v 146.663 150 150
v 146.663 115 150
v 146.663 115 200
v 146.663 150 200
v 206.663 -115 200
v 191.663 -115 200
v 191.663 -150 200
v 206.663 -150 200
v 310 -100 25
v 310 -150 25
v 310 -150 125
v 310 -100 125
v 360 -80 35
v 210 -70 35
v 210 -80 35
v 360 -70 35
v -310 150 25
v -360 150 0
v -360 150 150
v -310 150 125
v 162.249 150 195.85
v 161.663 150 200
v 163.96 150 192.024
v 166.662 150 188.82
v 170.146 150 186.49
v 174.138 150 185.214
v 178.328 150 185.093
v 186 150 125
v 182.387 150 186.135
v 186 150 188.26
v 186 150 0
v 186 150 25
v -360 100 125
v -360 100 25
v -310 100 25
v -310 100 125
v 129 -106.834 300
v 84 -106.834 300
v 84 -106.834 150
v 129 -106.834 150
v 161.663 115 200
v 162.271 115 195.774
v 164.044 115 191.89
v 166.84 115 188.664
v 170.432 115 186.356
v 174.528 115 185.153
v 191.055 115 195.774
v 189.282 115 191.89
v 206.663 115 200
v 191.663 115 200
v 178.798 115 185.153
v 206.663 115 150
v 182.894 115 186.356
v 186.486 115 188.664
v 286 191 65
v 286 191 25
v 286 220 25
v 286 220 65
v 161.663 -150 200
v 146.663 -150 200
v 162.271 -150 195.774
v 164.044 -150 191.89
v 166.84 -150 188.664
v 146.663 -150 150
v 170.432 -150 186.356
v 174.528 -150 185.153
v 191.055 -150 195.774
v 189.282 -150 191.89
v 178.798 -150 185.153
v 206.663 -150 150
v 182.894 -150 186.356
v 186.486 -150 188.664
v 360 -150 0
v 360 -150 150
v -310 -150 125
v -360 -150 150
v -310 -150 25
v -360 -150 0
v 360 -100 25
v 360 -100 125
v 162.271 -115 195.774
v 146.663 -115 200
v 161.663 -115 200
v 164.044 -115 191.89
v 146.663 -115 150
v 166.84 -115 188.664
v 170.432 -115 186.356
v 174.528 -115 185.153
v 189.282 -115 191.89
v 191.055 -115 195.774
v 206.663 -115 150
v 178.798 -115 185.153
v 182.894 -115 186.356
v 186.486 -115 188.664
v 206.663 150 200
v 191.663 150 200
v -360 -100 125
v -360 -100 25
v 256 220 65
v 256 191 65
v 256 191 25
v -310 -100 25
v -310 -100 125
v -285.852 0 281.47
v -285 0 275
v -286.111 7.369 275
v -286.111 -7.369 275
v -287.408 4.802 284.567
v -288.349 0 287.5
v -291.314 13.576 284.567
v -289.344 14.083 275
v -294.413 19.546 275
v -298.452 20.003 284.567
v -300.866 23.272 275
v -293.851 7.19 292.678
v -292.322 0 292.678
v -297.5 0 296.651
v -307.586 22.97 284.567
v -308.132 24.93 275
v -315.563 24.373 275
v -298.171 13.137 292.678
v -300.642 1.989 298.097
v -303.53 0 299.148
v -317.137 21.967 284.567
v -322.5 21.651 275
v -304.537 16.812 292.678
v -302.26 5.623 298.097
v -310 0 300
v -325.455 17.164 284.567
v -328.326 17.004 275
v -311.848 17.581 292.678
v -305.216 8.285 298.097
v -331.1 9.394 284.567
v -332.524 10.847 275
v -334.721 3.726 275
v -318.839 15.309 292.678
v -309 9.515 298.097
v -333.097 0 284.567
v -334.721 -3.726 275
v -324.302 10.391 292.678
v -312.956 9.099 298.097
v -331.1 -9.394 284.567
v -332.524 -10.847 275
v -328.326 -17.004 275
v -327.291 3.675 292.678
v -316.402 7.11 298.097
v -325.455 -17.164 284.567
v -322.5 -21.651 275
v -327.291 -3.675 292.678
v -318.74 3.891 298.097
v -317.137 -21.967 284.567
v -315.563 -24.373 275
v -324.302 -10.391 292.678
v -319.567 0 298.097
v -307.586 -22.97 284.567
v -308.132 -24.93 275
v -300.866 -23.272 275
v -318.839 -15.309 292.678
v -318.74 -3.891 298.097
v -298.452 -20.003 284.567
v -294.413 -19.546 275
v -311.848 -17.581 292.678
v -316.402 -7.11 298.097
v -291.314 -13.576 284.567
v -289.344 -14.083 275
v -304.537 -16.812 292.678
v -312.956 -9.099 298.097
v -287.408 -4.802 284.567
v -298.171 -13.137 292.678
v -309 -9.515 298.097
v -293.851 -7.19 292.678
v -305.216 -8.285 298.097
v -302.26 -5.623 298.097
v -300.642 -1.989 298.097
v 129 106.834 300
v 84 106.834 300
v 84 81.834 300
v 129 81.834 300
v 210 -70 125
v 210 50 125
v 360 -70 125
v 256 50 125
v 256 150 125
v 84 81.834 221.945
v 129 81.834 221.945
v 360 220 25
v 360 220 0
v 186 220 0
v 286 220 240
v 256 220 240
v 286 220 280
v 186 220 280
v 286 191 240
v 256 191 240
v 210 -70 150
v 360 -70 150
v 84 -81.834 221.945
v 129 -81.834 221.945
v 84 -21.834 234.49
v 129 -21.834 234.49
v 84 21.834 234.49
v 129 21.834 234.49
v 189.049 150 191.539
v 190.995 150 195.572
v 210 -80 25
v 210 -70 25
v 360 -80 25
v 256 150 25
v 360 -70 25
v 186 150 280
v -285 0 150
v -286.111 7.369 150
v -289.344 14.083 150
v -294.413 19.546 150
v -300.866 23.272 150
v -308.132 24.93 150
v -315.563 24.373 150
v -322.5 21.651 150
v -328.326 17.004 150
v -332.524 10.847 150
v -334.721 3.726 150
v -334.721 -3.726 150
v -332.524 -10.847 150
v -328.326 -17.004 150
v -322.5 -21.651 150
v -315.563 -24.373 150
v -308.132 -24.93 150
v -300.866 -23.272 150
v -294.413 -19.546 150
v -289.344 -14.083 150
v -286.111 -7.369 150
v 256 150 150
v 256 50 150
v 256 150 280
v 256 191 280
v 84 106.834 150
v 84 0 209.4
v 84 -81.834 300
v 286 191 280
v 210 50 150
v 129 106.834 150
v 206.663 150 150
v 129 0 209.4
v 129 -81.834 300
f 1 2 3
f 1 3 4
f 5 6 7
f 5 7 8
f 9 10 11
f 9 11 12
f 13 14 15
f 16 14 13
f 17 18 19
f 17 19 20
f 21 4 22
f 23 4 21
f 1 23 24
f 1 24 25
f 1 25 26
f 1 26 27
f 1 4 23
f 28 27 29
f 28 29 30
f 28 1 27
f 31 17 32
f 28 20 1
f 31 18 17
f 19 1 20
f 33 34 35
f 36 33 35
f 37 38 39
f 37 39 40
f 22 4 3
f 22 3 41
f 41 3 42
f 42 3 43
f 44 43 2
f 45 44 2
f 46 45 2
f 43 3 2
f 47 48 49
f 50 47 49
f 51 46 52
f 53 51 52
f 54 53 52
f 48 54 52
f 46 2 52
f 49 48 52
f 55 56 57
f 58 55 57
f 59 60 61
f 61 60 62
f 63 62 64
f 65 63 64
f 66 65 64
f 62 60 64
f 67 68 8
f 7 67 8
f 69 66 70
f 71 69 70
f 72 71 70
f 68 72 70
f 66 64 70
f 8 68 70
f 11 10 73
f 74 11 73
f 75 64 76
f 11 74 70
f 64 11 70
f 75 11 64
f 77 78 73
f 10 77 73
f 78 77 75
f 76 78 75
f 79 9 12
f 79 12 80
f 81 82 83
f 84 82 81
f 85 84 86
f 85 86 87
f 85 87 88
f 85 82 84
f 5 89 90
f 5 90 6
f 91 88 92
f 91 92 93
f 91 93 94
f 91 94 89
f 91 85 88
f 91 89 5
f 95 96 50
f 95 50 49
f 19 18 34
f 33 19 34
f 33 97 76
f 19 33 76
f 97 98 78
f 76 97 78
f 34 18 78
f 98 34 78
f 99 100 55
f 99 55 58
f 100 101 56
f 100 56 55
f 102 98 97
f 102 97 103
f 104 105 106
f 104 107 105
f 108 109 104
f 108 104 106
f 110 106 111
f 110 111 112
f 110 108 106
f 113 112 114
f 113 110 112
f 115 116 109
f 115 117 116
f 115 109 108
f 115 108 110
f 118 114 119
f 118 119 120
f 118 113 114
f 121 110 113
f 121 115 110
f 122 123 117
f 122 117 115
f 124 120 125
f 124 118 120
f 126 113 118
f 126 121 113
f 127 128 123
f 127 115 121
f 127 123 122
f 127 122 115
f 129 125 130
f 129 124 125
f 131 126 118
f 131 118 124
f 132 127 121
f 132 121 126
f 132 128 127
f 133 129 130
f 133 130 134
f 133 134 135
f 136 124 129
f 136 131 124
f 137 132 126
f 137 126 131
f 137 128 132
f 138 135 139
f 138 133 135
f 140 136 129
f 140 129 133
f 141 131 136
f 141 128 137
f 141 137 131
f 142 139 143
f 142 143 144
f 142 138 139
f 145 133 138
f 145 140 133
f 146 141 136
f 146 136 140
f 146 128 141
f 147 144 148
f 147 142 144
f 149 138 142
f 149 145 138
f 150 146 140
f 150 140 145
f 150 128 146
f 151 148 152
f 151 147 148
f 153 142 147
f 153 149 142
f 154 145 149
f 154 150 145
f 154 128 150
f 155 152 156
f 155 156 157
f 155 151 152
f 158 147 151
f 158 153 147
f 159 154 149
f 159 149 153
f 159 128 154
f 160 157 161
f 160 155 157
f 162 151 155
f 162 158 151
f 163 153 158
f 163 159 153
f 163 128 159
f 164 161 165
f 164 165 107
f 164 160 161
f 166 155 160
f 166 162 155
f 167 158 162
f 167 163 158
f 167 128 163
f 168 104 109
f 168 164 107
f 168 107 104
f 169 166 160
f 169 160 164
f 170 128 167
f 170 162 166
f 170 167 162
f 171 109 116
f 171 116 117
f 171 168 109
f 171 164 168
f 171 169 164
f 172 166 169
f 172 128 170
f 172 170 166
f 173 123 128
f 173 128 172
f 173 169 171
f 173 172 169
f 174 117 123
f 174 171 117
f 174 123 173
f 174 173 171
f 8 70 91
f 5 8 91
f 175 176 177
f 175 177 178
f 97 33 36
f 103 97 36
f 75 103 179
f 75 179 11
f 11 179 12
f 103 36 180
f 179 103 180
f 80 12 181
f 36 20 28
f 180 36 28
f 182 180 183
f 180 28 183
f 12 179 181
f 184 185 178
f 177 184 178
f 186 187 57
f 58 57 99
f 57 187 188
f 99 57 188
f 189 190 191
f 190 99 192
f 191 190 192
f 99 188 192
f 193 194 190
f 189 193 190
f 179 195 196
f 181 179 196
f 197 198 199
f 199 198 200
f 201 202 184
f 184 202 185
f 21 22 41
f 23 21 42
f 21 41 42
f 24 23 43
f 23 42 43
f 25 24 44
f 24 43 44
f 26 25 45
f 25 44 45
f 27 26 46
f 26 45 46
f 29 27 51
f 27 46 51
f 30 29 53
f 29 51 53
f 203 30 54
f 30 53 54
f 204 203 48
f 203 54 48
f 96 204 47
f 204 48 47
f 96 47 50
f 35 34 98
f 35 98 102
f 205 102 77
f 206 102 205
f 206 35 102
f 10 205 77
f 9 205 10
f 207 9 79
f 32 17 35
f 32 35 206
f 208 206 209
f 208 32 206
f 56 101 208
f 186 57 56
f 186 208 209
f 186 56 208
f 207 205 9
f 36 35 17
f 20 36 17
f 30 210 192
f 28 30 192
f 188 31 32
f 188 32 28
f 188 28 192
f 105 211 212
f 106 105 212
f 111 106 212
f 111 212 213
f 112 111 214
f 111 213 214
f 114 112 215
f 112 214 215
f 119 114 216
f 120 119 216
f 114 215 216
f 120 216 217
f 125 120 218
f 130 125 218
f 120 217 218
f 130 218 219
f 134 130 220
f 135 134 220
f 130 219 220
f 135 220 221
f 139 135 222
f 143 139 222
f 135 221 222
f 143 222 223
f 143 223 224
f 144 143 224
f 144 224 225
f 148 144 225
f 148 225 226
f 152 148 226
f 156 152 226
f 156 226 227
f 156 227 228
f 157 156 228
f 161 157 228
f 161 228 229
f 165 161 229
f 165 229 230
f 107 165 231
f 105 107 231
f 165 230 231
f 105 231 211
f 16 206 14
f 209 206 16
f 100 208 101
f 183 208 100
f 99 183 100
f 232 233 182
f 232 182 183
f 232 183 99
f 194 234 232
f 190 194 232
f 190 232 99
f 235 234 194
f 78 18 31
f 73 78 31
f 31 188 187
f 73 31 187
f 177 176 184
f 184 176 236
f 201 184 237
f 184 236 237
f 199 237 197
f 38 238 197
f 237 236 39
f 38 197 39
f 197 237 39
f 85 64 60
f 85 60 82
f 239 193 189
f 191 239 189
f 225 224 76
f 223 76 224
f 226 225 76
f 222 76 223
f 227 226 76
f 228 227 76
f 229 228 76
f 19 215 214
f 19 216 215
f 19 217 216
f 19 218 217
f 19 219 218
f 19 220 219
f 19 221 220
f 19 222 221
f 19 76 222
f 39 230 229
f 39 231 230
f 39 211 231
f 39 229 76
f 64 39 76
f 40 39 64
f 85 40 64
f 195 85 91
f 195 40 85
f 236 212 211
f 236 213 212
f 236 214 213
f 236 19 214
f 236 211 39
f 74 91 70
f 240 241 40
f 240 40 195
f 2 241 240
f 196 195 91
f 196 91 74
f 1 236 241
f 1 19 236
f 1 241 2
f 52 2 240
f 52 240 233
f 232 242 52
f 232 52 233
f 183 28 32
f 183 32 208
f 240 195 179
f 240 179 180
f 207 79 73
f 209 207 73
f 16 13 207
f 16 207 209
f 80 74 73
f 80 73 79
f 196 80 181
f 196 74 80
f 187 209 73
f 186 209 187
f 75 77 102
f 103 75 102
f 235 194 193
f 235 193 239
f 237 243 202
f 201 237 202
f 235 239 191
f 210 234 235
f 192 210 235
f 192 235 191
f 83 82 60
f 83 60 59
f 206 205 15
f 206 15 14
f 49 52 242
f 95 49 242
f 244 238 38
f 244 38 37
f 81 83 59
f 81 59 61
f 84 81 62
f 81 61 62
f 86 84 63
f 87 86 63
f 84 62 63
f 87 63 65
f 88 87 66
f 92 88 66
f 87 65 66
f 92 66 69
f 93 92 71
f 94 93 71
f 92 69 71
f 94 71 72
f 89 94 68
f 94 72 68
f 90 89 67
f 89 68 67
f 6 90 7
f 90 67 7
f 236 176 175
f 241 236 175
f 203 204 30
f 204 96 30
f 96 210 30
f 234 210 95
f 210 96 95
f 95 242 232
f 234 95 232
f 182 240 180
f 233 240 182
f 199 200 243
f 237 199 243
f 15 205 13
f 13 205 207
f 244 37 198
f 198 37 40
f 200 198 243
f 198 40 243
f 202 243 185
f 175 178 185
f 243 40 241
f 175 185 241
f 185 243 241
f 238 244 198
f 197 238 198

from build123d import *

# Parameters (mm, degrees)
F0_W      = 720
F0_H      = 300
F1_DEPTH  = 25
F2_W      = 50
F2_H      = 50
F3_DEPTH  = 100
F4_W      = 50
F4_H      = 50
F5_DEPTH  = 100
F6_W      = 50
F6_H      = 50
F7_DEPTH  = 25
F8_R      = 25
F9_DEPTH  = 150
F10_W     = 45
F10_H     = 106.8337794484
F11_DEPTH = 150
F13_DEPTH = 50
F14_W     = 70
F14_H     = 70
F15_DEPTH = 150
F16_DEPTH = 130
F17_R     = 25
F18_W     = 150
F18_H     = 120
F19_DEPTH = 25
F20_W     = 60
F20_H     = 35
F21_DEPTH = 50
F23_DEPTH = 300
F24_W     = 104
F24_H     = 100
F25_DEPTH = 150
F26_W     = 104
F26_H     = 170
F27_DEPTH = 25
F28_W     = 29
F28_H     = 40
F29_DEPTH = 30
F30_W     = 150
F30_H     = 10
F31_DEPTH = 10


with BuildPart() as f1:
    # F0 (on Top) → F1 (new body)
    with BuildSketch(Plane.XY):
        Rectangle(F0_W, F0_H)
    extrude(amount=F1_DEPTH)

    # F2 (on face) → F3 (join)
    with BuildSketch(Plane.XY.offset(25)):
        with Locations((-335, -125)):
            Rectangle(F2_W, F2_H)
    extrude(amount=F3_DEPTH)

    # F4 (on face) → F5 (join)
    with BuildSketch(Plane.XY.offset(25)):
        with Locations((335, -125)):
            Rectangle(F4_W, F4_H)
        with Locations((-335, 125)):
            Rectangle(F4_W, F4_H)
        with Locations((335, 125)):
            Rectangle(F4_W, F4_H)
    extrude(amount=F5_DEPTH)

    # F6 (on face) → F7 (join)
    with BuildSketch(Plane.XY.offset(125)):
        with Locations((-335, 125)):
            Rectangle(F6_W, F6_H)
        Polygon((360, 150), (-310, 150), (-310, 100), (-360, 100), (-360, -150), (360, -150), align=None)
    extrude(amount=F7_DEPTH)

    # F8 (on face) → F9 (join)
    with BuildSketch(Plane.XY.offset(150)):
        with Locations((-310, 0)):
            Circle(F8_R)
    extrude(amount=F9_DEPTH)

    # F10 (on face) → F11 (join)
    with BuildSketch(Plane.XY.offset(150)):
        with Locations((106.5, -53.4168897242)):
            Rectangle(F10_W, F10_H)
        with Locations((106.5, 53.4168897242)):
            Rectangle(F10_W, F10_H)
    extrude(amount=F11_DEPTH)

    # F12 (on face) → F13 (cut)
    with BuildSketch(Plane.YZ.offset(129)):
        Polygon((81.8337794484, 300), (-81.8337794484, 300), (-81.8337794484, 221.9447493553), (-21.8337794484, 234.4899773598), (0, 209.3995064497), (21.8337794484, 234.4899773598), (81.8337794484, 221.9447493553), align=None)
    extrude(amount=-F13_DEPTH, mode=Mode.SUBTRACT)

    # F14 (on face) → F15 (join)
    with BuildSketch(Plane.XY.offset(150)):
        with Locations((221, 185)):
            Rectangle(F14_W, F14_H)
    extrude(amount=-F15_DEPTH)

    # F14 (on face) → F16 (join)
    with BuildSketch(Plane.XY.offset(150)):
        with Locations((221, 185)):
            Rectangle(F14_W, F14_H)
    extrude(amount=F16_DEPTH)

    # F17
    f17_edges = [f1.edges().sort_by_distance(p)[0] for p in [
        (-335, 0, 300),
    ]]
    fillet(f17_edges, radius=F17_R)

    # F18 (on face) → F19 (cut)
    with BuildSketch(Plane.XY.offset(150)):
        with Locations((285, -10)):
            Rectangle(F18_W, F18_H)
    extrude(amount=-F19_DEPTH, mode=Mode.SUBTRACT)

    # F20 (on face) → F21 (join)
    with BuildSketch(Plane.XY.offset(150)):
        with Locations((176.6629952192, -132.5)):
            Rectangle(F20_W, F20_H)
        with Locations((176.6629952192, 132.5)):
            Rectangle(F20_W, F20_H)
    extrude(amount=F21_DEPTH)

    # F22 (on face) → F23 (cut)
    with BuildSketch(Plane.XZ.offset(150)):
        with BuildLine():
            Line((191.6629952192, 200), (161.6629952192, 200))
            ThreePointArc((161.6629952192, 200), (176.6629952192, 185), (191.6629952192, 200))
        make_face()
    extrude(amount=-F23_DEPTH, mode=Mode.SUBTRACT)

    # F24 (on face) → F25 (cut)
    with BuildSketch(Plane.XY.offset(150)):
        with Locations((308, 100)):
            Rectangle(F24_W, F24_H)
    extrude(amount=-F25_DEPTH, mode=Mode.SUBTRACT)

    # F26 (on face) → F27 (join)
    with BuildSketch(Plane.XY.offset(25)):
        with Locations((308, 135)):
            Rectangle(F26_W, F26_H)
    extrude(amount=-F27_DEPTH)

    # F28 (on face) → F29 (join)
    with BuildSketch(Plane.YZ.offset(256)):
        with Locations((205.5, 260)):
            Rectangle(F28_W, F28_H)
        with Locations((205.5, 45)):
            Rectangle(F28_W, F28_H)
    extrude(amount=F29_DEPTH)

    # F30 (on face) → F31 (join)
    with BuildSketch(Plane.XY.offset(25)):
        with Locations((285, -75)):
            Rectangle(F30_W, F30_H)
    extrude(amount=F31_DEPTH)


solid = f1.part
